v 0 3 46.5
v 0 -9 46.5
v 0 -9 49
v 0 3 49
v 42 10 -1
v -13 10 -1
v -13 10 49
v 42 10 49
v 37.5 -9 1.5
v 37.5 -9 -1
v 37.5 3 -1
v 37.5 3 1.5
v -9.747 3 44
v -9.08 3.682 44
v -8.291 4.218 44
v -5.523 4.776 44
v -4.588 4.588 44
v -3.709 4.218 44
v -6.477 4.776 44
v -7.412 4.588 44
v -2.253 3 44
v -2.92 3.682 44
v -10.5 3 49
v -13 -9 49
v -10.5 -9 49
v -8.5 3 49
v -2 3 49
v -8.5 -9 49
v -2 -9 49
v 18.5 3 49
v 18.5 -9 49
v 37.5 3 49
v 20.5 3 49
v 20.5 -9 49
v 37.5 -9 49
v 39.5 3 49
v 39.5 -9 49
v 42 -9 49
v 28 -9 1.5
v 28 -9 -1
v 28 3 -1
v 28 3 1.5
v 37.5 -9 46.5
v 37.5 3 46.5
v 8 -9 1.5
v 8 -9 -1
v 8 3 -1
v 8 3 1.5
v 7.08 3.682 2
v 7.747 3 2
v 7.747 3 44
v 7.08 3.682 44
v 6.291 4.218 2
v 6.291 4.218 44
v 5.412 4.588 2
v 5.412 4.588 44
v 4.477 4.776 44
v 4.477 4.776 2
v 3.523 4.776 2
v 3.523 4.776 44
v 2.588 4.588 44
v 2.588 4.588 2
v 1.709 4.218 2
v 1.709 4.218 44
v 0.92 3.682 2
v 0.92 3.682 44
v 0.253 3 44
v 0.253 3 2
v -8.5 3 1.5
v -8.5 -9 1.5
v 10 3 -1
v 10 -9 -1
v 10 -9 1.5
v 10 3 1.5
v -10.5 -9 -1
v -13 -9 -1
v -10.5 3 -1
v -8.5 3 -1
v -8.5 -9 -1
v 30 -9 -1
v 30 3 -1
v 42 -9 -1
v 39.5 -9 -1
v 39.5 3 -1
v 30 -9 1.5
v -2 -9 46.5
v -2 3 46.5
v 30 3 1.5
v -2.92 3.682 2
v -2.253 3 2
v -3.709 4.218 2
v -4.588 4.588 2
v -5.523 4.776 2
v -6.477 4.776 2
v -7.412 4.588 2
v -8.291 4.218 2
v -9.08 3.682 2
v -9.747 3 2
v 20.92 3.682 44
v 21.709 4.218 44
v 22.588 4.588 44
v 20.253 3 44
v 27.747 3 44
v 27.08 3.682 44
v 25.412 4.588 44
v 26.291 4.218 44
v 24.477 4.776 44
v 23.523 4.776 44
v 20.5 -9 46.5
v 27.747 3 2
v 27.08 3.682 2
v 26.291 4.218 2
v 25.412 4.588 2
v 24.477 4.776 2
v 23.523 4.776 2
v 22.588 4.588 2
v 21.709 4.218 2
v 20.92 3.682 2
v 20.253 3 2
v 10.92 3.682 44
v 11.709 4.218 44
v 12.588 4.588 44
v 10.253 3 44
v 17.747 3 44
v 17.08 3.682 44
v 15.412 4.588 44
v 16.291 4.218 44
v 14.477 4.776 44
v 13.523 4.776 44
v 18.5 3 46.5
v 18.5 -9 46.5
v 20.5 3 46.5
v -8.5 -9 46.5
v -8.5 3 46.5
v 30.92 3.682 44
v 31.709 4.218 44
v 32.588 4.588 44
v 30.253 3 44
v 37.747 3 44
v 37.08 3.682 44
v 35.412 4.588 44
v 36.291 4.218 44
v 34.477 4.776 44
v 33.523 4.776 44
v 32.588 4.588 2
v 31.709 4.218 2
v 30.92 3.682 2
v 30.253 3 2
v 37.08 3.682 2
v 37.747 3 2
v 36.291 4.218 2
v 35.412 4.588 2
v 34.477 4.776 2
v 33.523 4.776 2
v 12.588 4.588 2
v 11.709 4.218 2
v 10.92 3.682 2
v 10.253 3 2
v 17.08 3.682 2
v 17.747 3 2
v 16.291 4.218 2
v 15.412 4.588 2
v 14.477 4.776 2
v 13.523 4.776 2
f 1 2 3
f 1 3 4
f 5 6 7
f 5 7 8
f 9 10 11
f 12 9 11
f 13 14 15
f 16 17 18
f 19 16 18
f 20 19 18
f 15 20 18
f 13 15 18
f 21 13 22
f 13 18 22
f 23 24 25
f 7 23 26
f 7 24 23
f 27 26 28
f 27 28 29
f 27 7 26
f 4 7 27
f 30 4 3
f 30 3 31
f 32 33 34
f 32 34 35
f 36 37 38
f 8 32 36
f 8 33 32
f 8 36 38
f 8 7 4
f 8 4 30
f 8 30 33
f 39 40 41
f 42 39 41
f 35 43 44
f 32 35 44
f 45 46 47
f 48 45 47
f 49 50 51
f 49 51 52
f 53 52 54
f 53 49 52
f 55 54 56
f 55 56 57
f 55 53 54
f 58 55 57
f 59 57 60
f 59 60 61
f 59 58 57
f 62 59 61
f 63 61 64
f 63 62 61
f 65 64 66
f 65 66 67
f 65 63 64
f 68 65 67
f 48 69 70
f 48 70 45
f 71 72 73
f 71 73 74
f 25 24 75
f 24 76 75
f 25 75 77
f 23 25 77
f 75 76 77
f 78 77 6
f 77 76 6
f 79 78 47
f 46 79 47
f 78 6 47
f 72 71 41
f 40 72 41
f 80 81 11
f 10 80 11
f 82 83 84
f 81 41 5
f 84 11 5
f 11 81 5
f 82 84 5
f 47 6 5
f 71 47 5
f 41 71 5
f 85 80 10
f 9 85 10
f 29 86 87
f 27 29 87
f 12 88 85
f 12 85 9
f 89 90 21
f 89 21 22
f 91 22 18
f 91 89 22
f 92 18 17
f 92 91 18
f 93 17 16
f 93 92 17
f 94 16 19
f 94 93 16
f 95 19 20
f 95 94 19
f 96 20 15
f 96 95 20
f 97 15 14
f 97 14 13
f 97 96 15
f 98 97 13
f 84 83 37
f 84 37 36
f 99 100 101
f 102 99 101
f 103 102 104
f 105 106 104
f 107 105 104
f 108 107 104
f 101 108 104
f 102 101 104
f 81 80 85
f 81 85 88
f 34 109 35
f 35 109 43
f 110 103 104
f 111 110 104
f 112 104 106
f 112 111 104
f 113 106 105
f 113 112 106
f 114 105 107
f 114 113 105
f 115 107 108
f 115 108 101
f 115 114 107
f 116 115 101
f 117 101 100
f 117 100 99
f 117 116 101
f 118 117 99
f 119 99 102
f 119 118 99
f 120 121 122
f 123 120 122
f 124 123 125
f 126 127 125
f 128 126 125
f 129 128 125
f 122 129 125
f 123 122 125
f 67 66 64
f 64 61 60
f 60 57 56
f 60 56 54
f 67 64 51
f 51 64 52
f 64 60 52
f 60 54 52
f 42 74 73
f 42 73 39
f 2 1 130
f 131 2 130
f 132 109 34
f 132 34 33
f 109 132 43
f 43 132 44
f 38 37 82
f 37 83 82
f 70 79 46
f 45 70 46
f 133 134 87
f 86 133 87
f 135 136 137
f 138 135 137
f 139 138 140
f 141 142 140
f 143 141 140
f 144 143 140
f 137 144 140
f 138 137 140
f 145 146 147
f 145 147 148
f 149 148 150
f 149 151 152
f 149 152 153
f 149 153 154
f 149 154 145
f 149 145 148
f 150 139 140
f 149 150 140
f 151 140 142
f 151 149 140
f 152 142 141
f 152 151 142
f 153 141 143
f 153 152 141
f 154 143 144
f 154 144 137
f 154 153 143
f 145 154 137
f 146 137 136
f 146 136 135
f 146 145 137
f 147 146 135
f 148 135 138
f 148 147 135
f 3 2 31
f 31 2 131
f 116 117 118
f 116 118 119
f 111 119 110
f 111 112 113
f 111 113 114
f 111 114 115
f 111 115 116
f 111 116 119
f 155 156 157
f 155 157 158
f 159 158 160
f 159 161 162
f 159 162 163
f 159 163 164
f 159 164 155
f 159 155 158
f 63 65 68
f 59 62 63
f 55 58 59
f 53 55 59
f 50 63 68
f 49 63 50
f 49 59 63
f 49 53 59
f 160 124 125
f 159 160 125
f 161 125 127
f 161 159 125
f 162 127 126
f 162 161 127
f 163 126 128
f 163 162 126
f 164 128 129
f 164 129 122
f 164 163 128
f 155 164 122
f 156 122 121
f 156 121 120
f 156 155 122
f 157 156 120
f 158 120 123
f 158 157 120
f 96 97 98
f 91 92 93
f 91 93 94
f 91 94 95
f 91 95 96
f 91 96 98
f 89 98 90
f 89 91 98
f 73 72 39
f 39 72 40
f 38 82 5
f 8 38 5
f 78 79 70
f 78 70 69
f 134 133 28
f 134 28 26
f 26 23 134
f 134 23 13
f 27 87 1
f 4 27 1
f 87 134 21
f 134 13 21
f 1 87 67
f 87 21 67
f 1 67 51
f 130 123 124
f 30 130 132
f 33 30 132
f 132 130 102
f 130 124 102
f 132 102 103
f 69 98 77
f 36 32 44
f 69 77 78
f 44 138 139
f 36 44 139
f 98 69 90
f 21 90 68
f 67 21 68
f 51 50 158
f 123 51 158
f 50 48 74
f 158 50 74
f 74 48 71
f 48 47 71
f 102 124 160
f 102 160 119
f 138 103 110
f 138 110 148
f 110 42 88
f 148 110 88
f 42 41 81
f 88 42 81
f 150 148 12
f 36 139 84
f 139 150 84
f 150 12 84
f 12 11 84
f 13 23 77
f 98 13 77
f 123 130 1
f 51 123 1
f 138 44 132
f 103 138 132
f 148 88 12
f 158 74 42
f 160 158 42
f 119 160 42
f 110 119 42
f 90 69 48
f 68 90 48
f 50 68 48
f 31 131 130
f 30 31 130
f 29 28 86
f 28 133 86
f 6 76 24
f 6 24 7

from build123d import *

# Parameters (mm, degrees)
BOX004_W          = 2
BOX004_H          = 12
BOX004_DEPTH      = 5
BOX005_W          = 2
BOX005_H          = 12
BOX005_DEPTH      = 5
BOX008_W          = 2
BOX008_H          = 12
BOX008_DEPTH      = 5
BOX003_W          = 2
BOX003_H          = 12
BOX003_DEPTH      = 5
BOX038_W          = 2
BOX038_H          = 12
BOX038_DEPTH      = 5
BOX028_W          = 2
BOX028_H          = 12
BOX028_DEPTH      = 5
BOX007_W          = 2
BOX007_H          = 12
BOX007_DEPTH      = 5
BOX039_W          = 2
BOX039_H          = 12
BOX039_DEPTH      = 5
BOX036_W          = 2.5
BOX036_H          = 12
BOX036_DEPTH      = 50
BOX037_W          = 2.5
BOX037_H          = 12
BOX037_DEPTH      = 50
BOX035_W          = 55
BOX035_H          = 12
BOX035_DEPTH      = 2.5
BOX034_W          = 55
BOX034_H          = 12
BOX034_DEPTH      = 2.5
CYLINDER066_R     = 1.65
CYLINDER066_DEPTH = 1.6
CYLINDER065_R     = 4.8
CYLINDER065_DEPTH = 42
CYLINDER068_R     = 1.65
CYLINDER068_DEPTH = 1.6
CYLINDER067_R     = 4.8
CYLINDER067_DEPTH = 42
CYLINDER070_R     = 1.65
CYLINDER070_DEPTH = 1.6
CYLINDER069_R     = 4.8
CYLINDER069_DEPTH = 42
CYLINDER072_R     = 1.65
CYLINDER072_DEPTH = 1.6
CYLINDER071_R     = 4.8
CYLINDER071_DEPTH = 42
CYLINDER074_R     = 1.65
CYLINDER074_DEPTH = 1.6
CYLINDER073_R     = 4.8
CYLINDER073_DEPTH = 42
BOX032_W          = 55
BOX032_H          = 7
BOX032_DEPTH      = 50


with BuildPart() as cube004:
    # Box004 → Box004 (new body)
    with BuildSketch(Plane(origin=(18.5, -9, 46), x_dir=(1, 0, 0), z_dir=(0, 0, 1))):
        with Locations((1, 6)):
            Rectangle(BOX004_W, BOX004_H)
    extrude(amount=BOX004_DEPTH)


with BuildPart() as cube005:
    # Box005 → Box005 (new body)
    with BuildSketch(Plane(origin=(-2, -9, 46), x_dir=(1, 0, 0), z_dir=(0, 0, 1))):
        with Locations((1, 6)):
            Rectangle(BOX005_W, BOX005_H)
    extrude(amount=BOX005_DEPTH)


with BuildPart() as cube008:
    # Box008 → Box008 (new body)
    with BuildSketch(Plane(origin=(8, -9, -2), x_dir=(1, 0, 0), z_dir=(0, 0, 1))):
        with Locations((1, 6)):
            Rectangle(BOX008_W, BOX008_H)
    extrude(amount=BOX008_DEPTH)


with BuildPart() as fusion107:
    # Box003 → Box003 (new body)
    with BuildSketch(Plane(origin=(28, -9, -2), x_dir=(1, 0, 0), z_dir=(0, 0, 1))):
        with Locations((1, 6)):
            Rectangle(BOX003_W, BOX003_H)
    extrude(amount=BOX003_DEPTH)

    # Fusion107: union Cube004, Cube005, Cube008
    add(cube004.part)
    add(cube005.part)
    add(cube008.part)


with BuildPart() as cube036:
    # Box038 → Box038 (new body)
    with BuildSketch(Plane(origin=(-10.5, -9, 46), x_dir=(1, 0, 0), z_dir=(0, 0, 1))):
        with Locations((1, 6)):
            Rectangle(BOX038_W, BOX038_H)
    extrude(amount=BOX038_DEPTH)


with BuildPart() as cube027:
    # Box028 → Box028 (new body)
    with BuildSketch(Plane(origin=(37.5, -9, -2), x_dir=(1, 0, 0), z_dir=(0, 0, 1))):
        with Locations((1, 6)):
            Rectangle(BOX028_W, BOX028_H)
    extrude(amount=BOX028_DEPTH)


with BuildPart() as cube007:
    # Box007 → Box007 (new body)
    with BuildSketch(Plane(origin=(37.5, -9, 46), x_dir=(1, 0, 0), z_dir=(0, 0, 1))):
        with Locations((1, 6)):
            Rectangle(BOX007_W, BOX007_H)
    extrude(amount=BOX007_DEPTH)


with BuildPart() as fusion106:
    # Box039 → Box039 (new body)
    with BuildSketch(Plane(origin=(-10.5, -9, -2), x_dir=(1, 0, 0), z_dir=(0, 0, 1))):
        with Locations((1, 6)):
            Rectangle(BOX039_W, BOX039_H)
    extrude(amount=BOX039_DEPTH)

    # Fusion106: union Cube036, Cube027, Cube007
    add(cube036.part)
    add(cube027.part)
    add(cube007.part)


with BuildPart() as cube034:
    # Box036 → Box036 (new body)
    with BuildSketch(Plane(origin=(-13, -9, -1), x_dir=(1, 0, 0), z_dir=(0, 0, 1))):
        with Locations((1.25, 6)):
            Rectangle(BOX036_W, BOX036_H)
    extrude(amount=BOX036_DEPTH)


with BuildPart() as cube035:
    # Box037 → Box037 (new body)
    with BuildSketch(Plane(origin=(39.5, -9, -1), x_dir=(1, 0, 0), z_dir=(0, 0, 1))):
        with Locations((1.25, 6)):
            Rectangle(BOX037_W, BOX037_H)
    extrude(amount=BOX037_DEPTH)


with BuildPart() as cube033:
    # Box035 → Box035 (new body)
    with BuildSketch(Plane(origin=(-13, -9, 46.5), x_dir=(1, 0, 0), z_dir=(0, 0, 1))):
        with Locations((27.5, 6)):
            Rectangle(BOX035_W, BOX035_H)
    extrude(amount=BOX035_DEPTH)


with BuildPart() as cut045024:
    # Box034 → Box034 (new body)
    with BuildSketch(Plane(origin=(-13, -9, -1), x_dir=(1, 0, 0), z_dir=(0, 0, 1))):
        with Locations((27.5, 6)):
            Rectangle(BOX034_W, BOX034_H)
    extrude(amount=BOX034_DEPTH)

    # Fusion105: union Cube034, Cube035, Cube033
    add(cube034.part)
    add(cube035.part)
    add(cube033.part)

    # Cut045023: cut Fusion106
    add(fusion106.part, mode=Mode.SUBTRACT)

    # Cut045024: cut Fusion107
    add(fusion107.part, mode=Mode.SUBTRACT)


with BuildPart() as cylinder118:
    # Cylinder066 → Cylinder066 (new body)
    with BuildSketch(Plane.XY.offset(42)):
        Circle(CYLINDER066_R)
    extrude(amount=CYLINDER066_DEPTH)


with BuildPart() as fusion097:
    # Cylinder065 → Cylinder065 (new body)
    with BuildSketch(Plane.XY):
        Circle(CYLINDER065_R)
    extrude(amount=CYLINDER065_DEPTH)

    # Fusion097: union Cylinder118
    add(cylinder118.part)


with BuildPart() as fusion097_1:
    # Fusion097 placement: moved
    add(fusion097.part.moved(Location((2, 0, 0))))


with BuildPart() as cylinder120:
    # Cylinder068 → Cylinder068 (new body)
    with BuildSketch(Plane.XY.offset(42)):
        Circle(CYLINDER068_R)
    extrude(amount=CYLINDER068_DEPTH)


with BuildPart() as fusion098:
    # Cylinder067 → Cylinder067 (new body)
    with BuildSketch(Plane.XY):
        Circle(CYLINDER067_R)
    extrude(amount=CYLINDER067_DEPTH)

    # Fusion098: union Cylinder120
    add(cylinder120.part)


with BuildPart() as fusion098_1:
    # Fusion098 placement: moved
    add(fusion098.part.moved(Location((12, 0, 0))))


with BuildPart() as cylinder122:
    # Cylinder070 → Cylinder070 (new body)
    with BuildSketch(Plane.XY.offset(42)):
        Circle(CYLINDER070_R)
    extrude(amount=CYLINDER070_DEPTH)


with BuildPart() as fusion099:
    # Cylinder069 → Cylinder069 (new body)
    with BuildSketch(Plane.XY):
        Circle(CYLINDER069_R)
    extrude(amount=CYLINDER069_DEPTH)

    # Fusion099: union Cylinder122
    add(cylinder122.part)


with BuildPart() as fusion099_1:
    # Fusion099 placement: moved
    add(fusion099.part.moved(Location((22, 0, 0))))


with BuildPart() as cylinder124:
    # Cylinder072 → Cylinder072 (new body)
    with BuildSketch(Plane.XY.offset(42)):
        Circle(CYLINDER072_R)
    extrude(amount=CYLINDER072_DEPTH)


with BuildPart() as fusion100:
    # Cylinder071 → Cylinder071 (new body)
    with BuildSketch(Plane.XY):
        Circle(CYLINDER071_R)
    extrude(amount=CYLINDER071_DEPTH)

    # Fusion100: union Cylinder124
    add(cylinder124.part)


with BuildPart() as fusion100_1:
    # Fusion100 placement: moved
    add(fusion100.part.moved(Location((32, 0, 0))))


with BuildPart() as cylinder126:
    # Cylinder074 → Cylinder074 (new body)
    with BuildSketch(Plane.XY.offset(42)):
        Circle(CYLINDER074_R)
    extrude(amount=CYLINDER074_DEPTH)


with BuildPart() as aaa_batts001:
    # Cylinder073 → Cylinder073 (new body)
    with BuildSketch(Plane.XY):
        Circle(CYLINDER073_R)
    extrude(amount=CYLINDER073_DEPTH)

    # Fusion101: union Cylinder126
    add(cylinder126.part)


with BuildPart() as aaa_batts001_1:
    # Fusion101 placement: moved
    add(aaa_batts001.part.moved(Location((-8, 0, 0))))

    # Fusion102: union Fusion097, Fusion098, Fusion099, Fusion100
    add(fusion097_1.part)
    add(fusion098_1.part)
    add(fusion099_1.part)
    add(fusion100_1.part)


with BuildPart() as aaa_batts001_2:
    # Fusion102 placement: moved
    add(aaa_batts001_1.part.moved(Location((2, 0, 2))))


with BuildPart() as fusion110:
    # Box032 → Box032 (new body)
    with BuildSketch(Plane(origin=(-13, 3, -1), x_dir=(1, 0, 0), z_dir=(0, 0, 1))):
        with Locations((27.5, 3.5)):
            Rectangle(BOX032_W, BOX032_H)
    extrude(amount=BOX032_DEPTH)

    # Cut045022: cut AAA Batts001
    add(aaa_batts001_2.part, mode=Mode.SUBTRACT)

    # Fusion110: union Cut045024
    add(cut045024.part)


solid = fusion110.part
